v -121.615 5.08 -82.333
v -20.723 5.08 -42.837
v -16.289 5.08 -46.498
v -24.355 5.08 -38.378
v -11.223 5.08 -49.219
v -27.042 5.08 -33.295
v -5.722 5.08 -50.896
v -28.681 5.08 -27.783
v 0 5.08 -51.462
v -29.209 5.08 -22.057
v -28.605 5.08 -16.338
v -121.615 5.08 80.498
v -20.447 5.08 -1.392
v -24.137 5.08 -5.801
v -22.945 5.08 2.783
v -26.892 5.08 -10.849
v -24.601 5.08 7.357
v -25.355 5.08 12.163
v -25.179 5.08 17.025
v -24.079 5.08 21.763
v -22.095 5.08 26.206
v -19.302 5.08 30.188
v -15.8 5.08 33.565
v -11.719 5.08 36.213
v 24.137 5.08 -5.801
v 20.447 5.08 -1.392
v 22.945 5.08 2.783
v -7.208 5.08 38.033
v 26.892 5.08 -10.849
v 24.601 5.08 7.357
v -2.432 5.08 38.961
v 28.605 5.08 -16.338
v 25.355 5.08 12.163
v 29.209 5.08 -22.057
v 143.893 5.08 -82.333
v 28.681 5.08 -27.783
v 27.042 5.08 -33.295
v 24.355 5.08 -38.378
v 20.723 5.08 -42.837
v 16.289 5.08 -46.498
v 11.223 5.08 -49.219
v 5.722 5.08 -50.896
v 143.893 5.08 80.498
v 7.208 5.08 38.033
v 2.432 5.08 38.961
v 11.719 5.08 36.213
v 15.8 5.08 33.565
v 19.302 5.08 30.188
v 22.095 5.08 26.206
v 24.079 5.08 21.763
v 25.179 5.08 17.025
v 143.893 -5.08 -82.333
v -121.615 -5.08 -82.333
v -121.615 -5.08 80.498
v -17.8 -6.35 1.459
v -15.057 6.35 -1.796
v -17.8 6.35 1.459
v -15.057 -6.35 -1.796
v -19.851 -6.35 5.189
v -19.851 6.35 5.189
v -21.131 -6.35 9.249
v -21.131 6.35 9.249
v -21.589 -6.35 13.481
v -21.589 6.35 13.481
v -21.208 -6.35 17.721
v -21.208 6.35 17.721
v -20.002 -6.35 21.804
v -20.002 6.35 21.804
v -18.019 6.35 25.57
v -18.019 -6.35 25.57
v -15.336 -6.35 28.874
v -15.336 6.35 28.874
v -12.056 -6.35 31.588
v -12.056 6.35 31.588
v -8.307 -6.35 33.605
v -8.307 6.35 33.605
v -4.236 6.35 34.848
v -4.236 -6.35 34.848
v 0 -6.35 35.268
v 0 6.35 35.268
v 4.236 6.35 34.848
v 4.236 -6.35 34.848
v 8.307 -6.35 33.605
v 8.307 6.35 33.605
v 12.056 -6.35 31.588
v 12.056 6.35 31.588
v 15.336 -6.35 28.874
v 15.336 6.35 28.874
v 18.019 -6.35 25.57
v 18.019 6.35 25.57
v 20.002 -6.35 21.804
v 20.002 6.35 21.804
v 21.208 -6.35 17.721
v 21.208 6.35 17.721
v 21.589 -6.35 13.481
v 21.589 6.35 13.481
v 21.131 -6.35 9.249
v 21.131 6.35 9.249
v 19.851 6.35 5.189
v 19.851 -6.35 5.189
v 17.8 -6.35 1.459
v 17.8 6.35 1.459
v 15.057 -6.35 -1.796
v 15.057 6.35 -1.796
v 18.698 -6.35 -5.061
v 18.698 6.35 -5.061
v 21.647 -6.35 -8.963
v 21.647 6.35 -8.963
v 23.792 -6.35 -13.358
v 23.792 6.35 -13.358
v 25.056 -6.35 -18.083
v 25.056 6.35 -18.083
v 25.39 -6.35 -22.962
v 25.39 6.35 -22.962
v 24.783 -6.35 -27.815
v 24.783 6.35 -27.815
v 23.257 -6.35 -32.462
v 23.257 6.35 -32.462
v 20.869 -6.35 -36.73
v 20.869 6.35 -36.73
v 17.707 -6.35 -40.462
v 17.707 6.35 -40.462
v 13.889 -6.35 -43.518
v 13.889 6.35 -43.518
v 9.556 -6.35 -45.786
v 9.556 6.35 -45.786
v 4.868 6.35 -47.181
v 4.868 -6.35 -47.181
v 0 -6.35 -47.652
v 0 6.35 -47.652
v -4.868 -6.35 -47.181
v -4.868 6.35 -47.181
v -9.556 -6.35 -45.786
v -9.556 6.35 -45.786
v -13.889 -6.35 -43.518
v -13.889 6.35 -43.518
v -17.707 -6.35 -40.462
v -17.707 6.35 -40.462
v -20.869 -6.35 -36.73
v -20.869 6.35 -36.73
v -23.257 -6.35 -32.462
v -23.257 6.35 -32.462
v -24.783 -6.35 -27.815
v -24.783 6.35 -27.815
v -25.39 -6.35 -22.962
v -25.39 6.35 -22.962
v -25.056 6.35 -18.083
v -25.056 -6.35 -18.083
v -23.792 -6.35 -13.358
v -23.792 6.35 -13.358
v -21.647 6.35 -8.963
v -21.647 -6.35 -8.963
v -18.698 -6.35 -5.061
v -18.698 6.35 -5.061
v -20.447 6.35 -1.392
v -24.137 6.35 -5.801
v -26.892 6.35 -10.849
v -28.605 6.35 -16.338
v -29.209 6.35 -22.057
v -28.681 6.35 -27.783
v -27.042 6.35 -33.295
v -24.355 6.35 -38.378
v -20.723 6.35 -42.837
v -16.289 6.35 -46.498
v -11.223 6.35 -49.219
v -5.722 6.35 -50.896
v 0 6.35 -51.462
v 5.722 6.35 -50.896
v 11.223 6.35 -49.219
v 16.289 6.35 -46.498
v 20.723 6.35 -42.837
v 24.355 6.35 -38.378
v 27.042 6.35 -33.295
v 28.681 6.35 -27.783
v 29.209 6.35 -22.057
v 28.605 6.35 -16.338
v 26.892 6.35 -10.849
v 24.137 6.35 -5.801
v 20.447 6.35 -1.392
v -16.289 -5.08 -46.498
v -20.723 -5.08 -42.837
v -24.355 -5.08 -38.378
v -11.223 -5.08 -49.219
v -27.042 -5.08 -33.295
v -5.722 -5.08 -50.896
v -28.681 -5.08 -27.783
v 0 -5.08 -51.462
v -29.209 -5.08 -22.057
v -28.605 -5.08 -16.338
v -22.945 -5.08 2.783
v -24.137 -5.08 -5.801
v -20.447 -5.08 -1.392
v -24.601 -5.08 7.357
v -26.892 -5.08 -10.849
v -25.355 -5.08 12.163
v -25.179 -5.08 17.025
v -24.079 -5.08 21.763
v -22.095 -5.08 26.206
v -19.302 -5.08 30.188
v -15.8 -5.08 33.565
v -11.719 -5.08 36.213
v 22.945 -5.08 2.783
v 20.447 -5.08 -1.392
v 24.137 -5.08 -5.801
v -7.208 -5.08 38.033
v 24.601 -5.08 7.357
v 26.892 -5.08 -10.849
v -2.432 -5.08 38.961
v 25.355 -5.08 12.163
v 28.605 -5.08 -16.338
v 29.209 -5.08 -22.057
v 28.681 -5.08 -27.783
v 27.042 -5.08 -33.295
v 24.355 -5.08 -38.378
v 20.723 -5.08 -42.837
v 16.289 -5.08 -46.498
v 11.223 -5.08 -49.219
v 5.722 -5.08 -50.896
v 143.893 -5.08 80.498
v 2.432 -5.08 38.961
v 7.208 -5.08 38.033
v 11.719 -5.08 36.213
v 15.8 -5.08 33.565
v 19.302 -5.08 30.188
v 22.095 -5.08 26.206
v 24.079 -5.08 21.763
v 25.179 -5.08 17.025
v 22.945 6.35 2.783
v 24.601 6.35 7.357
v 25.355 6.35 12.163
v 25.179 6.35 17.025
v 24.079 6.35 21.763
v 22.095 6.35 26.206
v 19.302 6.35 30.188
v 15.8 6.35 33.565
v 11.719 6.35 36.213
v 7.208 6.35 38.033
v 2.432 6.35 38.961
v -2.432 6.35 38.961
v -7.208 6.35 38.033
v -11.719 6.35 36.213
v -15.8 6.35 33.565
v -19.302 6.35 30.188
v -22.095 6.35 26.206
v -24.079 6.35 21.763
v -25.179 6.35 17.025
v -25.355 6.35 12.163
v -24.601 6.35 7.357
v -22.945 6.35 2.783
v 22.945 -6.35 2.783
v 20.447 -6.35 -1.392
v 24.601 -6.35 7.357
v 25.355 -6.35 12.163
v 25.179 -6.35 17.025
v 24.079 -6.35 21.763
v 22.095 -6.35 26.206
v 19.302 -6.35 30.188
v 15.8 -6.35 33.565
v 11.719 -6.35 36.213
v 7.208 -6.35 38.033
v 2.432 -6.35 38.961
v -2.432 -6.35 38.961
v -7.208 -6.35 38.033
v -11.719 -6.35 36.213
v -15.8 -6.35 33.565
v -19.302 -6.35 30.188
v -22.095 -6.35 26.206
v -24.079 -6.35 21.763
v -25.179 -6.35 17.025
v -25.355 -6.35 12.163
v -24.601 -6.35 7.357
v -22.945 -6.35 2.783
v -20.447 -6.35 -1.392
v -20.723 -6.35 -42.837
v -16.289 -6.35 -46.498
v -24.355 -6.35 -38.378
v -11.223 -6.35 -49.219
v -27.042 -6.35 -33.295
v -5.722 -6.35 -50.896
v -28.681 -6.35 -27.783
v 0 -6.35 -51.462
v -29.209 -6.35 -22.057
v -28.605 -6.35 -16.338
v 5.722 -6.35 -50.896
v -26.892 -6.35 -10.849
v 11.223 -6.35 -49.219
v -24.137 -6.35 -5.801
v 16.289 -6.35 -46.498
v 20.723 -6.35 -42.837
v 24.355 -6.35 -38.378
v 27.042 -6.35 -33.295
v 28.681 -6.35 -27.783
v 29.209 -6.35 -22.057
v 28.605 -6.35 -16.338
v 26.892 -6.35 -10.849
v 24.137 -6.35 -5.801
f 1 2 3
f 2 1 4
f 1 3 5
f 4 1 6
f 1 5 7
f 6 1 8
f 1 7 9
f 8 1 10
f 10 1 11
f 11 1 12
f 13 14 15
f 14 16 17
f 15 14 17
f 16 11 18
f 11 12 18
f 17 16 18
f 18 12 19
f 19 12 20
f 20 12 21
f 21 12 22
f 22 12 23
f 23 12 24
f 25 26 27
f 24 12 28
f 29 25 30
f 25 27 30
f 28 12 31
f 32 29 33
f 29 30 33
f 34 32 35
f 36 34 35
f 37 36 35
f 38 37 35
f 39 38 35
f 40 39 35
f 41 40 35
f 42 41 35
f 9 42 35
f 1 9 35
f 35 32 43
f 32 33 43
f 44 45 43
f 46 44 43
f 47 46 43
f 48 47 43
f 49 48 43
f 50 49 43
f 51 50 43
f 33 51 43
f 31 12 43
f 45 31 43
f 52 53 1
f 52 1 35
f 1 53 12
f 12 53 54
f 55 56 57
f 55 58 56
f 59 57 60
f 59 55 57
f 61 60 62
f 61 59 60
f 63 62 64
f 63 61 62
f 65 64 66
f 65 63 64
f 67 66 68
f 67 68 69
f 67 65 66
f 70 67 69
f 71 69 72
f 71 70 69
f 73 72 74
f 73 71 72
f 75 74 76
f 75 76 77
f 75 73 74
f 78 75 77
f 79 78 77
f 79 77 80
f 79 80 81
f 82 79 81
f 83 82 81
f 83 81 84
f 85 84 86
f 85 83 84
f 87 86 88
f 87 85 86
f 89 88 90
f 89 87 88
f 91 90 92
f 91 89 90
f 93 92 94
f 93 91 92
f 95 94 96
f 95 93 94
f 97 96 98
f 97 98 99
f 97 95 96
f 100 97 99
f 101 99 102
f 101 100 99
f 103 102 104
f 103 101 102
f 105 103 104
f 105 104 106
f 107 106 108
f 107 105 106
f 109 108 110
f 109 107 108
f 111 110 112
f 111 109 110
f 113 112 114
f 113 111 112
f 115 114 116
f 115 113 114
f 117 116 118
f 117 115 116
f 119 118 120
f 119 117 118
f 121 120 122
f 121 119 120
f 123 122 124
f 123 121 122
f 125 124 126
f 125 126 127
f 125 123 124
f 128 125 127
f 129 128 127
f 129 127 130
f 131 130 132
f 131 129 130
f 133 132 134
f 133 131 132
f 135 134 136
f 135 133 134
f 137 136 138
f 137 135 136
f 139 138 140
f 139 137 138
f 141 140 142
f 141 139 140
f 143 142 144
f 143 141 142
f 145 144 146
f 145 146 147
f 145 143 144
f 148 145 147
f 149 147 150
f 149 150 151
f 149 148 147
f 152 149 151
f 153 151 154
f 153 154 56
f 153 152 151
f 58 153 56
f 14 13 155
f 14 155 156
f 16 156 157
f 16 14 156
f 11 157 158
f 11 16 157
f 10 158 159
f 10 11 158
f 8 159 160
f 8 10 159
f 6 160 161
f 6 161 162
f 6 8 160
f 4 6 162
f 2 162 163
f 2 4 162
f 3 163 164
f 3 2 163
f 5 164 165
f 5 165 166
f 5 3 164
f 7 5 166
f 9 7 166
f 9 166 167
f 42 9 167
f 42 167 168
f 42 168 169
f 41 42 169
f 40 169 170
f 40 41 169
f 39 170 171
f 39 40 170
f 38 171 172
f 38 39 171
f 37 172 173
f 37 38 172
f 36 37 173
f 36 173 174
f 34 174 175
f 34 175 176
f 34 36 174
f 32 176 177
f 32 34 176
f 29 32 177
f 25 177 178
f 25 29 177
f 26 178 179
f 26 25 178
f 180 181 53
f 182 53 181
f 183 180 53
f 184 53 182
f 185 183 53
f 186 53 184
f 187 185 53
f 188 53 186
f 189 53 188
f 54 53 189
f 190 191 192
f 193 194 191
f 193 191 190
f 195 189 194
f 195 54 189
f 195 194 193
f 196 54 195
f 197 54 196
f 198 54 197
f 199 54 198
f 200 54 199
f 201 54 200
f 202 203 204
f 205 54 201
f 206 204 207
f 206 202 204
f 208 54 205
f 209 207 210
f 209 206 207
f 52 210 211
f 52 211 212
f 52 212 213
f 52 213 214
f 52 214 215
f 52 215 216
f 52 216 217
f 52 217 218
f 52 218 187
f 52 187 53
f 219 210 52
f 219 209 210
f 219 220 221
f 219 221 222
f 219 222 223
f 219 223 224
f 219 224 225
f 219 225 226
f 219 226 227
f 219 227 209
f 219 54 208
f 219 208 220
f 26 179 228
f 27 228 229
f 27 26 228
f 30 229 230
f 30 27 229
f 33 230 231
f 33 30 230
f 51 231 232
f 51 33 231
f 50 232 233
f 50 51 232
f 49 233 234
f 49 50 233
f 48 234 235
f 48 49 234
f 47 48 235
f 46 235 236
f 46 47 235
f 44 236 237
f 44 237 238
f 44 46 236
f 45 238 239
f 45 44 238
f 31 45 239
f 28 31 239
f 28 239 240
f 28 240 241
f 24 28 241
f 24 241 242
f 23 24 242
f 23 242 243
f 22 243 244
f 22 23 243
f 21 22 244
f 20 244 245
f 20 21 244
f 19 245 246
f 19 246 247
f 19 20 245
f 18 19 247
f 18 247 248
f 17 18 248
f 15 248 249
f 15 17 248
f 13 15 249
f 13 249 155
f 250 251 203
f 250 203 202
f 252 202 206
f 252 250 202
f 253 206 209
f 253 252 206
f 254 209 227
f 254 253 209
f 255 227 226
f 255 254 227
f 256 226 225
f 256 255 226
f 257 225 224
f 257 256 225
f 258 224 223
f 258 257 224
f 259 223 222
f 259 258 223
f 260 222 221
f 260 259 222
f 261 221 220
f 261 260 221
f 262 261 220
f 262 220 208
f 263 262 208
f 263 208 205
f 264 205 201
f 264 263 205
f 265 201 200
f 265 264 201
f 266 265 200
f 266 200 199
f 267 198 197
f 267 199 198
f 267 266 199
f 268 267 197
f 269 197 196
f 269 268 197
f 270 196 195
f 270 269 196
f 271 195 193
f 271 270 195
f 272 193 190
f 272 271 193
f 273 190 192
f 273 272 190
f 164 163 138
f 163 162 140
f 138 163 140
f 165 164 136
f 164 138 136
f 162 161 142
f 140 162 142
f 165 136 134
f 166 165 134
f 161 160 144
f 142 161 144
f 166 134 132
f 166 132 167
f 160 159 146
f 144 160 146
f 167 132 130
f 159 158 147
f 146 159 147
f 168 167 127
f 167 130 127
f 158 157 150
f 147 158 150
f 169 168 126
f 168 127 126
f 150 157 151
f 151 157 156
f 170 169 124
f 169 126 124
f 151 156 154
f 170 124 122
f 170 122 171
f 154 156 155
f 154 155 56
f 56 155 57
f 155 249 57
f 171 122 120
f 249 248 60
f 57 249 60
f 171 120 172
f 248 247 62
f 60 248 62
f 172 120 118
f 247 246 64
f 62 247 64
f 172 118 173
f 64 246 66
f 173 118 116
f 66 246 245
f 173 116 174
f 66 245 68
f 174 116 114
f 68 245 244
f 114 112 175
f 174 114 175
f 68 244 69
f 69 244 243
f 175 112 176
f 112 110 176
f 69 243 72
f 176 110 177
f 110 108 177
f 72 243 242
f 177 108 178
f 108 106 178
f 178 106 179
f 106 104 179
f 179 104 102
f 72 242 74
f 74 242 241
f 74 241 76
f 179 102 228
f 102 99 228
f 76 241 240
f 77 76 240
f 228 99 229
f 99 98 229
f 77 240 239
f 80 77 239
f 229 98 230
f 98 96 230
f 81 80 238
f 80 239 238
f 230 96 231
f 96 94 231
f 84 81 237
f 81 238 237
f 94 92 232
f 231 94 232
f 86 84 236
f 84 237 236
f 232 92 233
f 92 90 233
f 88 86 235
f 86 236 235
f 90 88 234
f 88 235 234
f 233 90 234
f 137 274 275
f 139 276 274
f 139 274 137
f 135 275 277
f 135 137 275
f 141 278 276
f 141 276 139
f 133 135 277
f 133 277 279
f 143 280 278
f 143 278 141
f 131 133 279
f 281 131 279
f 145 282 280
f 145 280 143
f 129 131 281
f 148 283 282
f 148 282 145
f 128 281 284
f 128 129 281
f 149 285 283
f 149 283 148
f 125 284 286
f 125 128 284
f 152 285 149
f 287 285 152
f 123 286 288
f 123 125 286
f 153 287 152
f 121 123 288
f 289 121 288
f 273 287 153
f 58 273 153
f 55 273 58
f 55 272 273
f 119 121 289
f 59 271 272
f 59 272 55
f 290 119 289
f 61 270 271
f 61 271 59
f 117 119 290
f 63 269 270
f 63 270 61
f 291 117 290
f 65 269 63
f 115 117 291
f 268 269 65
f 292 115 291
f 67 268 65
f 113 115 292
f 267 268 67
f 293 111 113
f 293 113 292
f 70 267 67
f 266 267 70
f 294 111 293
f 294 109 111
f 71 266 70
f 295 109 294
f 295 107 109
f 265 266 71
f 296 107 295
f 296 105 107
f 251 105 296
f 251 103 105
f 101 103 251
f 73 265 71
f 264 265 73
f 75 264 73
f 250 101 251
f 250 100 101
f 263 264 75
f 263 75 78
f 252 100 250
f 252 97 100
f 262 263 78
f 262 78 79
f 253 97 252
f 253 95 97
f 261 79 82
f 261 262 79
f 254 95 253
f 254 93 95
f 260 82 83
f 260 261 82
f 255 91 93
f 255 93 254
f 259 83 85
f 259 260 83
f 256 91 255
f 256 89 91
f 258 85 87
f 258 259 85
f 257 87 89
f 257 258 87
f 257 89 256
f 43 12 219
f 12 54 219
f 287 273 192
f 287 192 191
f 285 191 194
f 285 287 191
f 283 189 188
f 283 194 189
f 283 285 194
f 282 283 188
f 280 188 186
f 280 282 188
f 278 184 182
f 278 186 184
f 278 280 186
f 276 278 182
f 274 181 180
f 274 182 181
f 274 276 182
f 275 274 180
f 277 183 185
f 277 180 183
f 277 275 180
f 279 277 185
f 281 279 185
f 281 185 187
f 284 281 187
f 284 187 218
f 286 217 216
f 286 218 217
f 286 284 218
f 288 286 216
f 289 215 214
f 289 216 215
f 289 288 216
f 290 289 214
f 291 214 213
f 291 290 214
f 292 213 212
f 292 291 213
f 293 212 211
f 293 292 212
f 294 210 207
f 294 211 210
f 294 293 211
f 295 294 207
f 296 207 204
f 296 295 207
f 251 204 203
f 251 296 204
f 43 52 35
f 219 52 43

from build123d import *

# Parameters (mm, degrees)
F1_DEPTH = 6.35
F0_W     = 265.508406
F0_H     = 162.831157
F2_DEPTH = 5.08


with BuildPart() as f1:
    # F0 (on Front) → F1 (new body, symmetric)
    with BuildSketch(Plane.XZ):
        with BuildLine():
            ThreePointArc((-20.447047, -1.391527), (0, -51.461593), (20.447047, -1.391527))
            ThreePointArc((20.447047, -1.391527), (0, 39.077588), (-20.447047, -1.391527))
        make_face()
        with BuildLine():
            ThreePointArc((15.056898, -1.795547), (0, -47.651593), (-15.056898, -1.795547))
            ThreePointArc((-15.056898, -1.795547), (0, 35.267588), (15.056898, -1.795547))
        make_face(mode=Mode.SUBTRACT)
    extrude(amount=F1_DEPTH, both=True)

    # F0 (on Front) → F2 (join, symmetric)
    with BuildSketch(Plane.XZ):
        with Locations((11.139218, -0.917264)):
            Rectangle(F0_W, F0_H)
        with BuildLine():
            ThreePointArc((-20.447047, -1.391527), (0, 39.077588), (20.447047, -1.391527))
            ThreePointArc((20.447047, -1.391527), (0, -51.461593), (-20.447047, -1.391527))
        make_face(mode=Mode.SUBTRACT)
    extrude(amount=F2_DEPTH, both=True)


solid = f1.part
